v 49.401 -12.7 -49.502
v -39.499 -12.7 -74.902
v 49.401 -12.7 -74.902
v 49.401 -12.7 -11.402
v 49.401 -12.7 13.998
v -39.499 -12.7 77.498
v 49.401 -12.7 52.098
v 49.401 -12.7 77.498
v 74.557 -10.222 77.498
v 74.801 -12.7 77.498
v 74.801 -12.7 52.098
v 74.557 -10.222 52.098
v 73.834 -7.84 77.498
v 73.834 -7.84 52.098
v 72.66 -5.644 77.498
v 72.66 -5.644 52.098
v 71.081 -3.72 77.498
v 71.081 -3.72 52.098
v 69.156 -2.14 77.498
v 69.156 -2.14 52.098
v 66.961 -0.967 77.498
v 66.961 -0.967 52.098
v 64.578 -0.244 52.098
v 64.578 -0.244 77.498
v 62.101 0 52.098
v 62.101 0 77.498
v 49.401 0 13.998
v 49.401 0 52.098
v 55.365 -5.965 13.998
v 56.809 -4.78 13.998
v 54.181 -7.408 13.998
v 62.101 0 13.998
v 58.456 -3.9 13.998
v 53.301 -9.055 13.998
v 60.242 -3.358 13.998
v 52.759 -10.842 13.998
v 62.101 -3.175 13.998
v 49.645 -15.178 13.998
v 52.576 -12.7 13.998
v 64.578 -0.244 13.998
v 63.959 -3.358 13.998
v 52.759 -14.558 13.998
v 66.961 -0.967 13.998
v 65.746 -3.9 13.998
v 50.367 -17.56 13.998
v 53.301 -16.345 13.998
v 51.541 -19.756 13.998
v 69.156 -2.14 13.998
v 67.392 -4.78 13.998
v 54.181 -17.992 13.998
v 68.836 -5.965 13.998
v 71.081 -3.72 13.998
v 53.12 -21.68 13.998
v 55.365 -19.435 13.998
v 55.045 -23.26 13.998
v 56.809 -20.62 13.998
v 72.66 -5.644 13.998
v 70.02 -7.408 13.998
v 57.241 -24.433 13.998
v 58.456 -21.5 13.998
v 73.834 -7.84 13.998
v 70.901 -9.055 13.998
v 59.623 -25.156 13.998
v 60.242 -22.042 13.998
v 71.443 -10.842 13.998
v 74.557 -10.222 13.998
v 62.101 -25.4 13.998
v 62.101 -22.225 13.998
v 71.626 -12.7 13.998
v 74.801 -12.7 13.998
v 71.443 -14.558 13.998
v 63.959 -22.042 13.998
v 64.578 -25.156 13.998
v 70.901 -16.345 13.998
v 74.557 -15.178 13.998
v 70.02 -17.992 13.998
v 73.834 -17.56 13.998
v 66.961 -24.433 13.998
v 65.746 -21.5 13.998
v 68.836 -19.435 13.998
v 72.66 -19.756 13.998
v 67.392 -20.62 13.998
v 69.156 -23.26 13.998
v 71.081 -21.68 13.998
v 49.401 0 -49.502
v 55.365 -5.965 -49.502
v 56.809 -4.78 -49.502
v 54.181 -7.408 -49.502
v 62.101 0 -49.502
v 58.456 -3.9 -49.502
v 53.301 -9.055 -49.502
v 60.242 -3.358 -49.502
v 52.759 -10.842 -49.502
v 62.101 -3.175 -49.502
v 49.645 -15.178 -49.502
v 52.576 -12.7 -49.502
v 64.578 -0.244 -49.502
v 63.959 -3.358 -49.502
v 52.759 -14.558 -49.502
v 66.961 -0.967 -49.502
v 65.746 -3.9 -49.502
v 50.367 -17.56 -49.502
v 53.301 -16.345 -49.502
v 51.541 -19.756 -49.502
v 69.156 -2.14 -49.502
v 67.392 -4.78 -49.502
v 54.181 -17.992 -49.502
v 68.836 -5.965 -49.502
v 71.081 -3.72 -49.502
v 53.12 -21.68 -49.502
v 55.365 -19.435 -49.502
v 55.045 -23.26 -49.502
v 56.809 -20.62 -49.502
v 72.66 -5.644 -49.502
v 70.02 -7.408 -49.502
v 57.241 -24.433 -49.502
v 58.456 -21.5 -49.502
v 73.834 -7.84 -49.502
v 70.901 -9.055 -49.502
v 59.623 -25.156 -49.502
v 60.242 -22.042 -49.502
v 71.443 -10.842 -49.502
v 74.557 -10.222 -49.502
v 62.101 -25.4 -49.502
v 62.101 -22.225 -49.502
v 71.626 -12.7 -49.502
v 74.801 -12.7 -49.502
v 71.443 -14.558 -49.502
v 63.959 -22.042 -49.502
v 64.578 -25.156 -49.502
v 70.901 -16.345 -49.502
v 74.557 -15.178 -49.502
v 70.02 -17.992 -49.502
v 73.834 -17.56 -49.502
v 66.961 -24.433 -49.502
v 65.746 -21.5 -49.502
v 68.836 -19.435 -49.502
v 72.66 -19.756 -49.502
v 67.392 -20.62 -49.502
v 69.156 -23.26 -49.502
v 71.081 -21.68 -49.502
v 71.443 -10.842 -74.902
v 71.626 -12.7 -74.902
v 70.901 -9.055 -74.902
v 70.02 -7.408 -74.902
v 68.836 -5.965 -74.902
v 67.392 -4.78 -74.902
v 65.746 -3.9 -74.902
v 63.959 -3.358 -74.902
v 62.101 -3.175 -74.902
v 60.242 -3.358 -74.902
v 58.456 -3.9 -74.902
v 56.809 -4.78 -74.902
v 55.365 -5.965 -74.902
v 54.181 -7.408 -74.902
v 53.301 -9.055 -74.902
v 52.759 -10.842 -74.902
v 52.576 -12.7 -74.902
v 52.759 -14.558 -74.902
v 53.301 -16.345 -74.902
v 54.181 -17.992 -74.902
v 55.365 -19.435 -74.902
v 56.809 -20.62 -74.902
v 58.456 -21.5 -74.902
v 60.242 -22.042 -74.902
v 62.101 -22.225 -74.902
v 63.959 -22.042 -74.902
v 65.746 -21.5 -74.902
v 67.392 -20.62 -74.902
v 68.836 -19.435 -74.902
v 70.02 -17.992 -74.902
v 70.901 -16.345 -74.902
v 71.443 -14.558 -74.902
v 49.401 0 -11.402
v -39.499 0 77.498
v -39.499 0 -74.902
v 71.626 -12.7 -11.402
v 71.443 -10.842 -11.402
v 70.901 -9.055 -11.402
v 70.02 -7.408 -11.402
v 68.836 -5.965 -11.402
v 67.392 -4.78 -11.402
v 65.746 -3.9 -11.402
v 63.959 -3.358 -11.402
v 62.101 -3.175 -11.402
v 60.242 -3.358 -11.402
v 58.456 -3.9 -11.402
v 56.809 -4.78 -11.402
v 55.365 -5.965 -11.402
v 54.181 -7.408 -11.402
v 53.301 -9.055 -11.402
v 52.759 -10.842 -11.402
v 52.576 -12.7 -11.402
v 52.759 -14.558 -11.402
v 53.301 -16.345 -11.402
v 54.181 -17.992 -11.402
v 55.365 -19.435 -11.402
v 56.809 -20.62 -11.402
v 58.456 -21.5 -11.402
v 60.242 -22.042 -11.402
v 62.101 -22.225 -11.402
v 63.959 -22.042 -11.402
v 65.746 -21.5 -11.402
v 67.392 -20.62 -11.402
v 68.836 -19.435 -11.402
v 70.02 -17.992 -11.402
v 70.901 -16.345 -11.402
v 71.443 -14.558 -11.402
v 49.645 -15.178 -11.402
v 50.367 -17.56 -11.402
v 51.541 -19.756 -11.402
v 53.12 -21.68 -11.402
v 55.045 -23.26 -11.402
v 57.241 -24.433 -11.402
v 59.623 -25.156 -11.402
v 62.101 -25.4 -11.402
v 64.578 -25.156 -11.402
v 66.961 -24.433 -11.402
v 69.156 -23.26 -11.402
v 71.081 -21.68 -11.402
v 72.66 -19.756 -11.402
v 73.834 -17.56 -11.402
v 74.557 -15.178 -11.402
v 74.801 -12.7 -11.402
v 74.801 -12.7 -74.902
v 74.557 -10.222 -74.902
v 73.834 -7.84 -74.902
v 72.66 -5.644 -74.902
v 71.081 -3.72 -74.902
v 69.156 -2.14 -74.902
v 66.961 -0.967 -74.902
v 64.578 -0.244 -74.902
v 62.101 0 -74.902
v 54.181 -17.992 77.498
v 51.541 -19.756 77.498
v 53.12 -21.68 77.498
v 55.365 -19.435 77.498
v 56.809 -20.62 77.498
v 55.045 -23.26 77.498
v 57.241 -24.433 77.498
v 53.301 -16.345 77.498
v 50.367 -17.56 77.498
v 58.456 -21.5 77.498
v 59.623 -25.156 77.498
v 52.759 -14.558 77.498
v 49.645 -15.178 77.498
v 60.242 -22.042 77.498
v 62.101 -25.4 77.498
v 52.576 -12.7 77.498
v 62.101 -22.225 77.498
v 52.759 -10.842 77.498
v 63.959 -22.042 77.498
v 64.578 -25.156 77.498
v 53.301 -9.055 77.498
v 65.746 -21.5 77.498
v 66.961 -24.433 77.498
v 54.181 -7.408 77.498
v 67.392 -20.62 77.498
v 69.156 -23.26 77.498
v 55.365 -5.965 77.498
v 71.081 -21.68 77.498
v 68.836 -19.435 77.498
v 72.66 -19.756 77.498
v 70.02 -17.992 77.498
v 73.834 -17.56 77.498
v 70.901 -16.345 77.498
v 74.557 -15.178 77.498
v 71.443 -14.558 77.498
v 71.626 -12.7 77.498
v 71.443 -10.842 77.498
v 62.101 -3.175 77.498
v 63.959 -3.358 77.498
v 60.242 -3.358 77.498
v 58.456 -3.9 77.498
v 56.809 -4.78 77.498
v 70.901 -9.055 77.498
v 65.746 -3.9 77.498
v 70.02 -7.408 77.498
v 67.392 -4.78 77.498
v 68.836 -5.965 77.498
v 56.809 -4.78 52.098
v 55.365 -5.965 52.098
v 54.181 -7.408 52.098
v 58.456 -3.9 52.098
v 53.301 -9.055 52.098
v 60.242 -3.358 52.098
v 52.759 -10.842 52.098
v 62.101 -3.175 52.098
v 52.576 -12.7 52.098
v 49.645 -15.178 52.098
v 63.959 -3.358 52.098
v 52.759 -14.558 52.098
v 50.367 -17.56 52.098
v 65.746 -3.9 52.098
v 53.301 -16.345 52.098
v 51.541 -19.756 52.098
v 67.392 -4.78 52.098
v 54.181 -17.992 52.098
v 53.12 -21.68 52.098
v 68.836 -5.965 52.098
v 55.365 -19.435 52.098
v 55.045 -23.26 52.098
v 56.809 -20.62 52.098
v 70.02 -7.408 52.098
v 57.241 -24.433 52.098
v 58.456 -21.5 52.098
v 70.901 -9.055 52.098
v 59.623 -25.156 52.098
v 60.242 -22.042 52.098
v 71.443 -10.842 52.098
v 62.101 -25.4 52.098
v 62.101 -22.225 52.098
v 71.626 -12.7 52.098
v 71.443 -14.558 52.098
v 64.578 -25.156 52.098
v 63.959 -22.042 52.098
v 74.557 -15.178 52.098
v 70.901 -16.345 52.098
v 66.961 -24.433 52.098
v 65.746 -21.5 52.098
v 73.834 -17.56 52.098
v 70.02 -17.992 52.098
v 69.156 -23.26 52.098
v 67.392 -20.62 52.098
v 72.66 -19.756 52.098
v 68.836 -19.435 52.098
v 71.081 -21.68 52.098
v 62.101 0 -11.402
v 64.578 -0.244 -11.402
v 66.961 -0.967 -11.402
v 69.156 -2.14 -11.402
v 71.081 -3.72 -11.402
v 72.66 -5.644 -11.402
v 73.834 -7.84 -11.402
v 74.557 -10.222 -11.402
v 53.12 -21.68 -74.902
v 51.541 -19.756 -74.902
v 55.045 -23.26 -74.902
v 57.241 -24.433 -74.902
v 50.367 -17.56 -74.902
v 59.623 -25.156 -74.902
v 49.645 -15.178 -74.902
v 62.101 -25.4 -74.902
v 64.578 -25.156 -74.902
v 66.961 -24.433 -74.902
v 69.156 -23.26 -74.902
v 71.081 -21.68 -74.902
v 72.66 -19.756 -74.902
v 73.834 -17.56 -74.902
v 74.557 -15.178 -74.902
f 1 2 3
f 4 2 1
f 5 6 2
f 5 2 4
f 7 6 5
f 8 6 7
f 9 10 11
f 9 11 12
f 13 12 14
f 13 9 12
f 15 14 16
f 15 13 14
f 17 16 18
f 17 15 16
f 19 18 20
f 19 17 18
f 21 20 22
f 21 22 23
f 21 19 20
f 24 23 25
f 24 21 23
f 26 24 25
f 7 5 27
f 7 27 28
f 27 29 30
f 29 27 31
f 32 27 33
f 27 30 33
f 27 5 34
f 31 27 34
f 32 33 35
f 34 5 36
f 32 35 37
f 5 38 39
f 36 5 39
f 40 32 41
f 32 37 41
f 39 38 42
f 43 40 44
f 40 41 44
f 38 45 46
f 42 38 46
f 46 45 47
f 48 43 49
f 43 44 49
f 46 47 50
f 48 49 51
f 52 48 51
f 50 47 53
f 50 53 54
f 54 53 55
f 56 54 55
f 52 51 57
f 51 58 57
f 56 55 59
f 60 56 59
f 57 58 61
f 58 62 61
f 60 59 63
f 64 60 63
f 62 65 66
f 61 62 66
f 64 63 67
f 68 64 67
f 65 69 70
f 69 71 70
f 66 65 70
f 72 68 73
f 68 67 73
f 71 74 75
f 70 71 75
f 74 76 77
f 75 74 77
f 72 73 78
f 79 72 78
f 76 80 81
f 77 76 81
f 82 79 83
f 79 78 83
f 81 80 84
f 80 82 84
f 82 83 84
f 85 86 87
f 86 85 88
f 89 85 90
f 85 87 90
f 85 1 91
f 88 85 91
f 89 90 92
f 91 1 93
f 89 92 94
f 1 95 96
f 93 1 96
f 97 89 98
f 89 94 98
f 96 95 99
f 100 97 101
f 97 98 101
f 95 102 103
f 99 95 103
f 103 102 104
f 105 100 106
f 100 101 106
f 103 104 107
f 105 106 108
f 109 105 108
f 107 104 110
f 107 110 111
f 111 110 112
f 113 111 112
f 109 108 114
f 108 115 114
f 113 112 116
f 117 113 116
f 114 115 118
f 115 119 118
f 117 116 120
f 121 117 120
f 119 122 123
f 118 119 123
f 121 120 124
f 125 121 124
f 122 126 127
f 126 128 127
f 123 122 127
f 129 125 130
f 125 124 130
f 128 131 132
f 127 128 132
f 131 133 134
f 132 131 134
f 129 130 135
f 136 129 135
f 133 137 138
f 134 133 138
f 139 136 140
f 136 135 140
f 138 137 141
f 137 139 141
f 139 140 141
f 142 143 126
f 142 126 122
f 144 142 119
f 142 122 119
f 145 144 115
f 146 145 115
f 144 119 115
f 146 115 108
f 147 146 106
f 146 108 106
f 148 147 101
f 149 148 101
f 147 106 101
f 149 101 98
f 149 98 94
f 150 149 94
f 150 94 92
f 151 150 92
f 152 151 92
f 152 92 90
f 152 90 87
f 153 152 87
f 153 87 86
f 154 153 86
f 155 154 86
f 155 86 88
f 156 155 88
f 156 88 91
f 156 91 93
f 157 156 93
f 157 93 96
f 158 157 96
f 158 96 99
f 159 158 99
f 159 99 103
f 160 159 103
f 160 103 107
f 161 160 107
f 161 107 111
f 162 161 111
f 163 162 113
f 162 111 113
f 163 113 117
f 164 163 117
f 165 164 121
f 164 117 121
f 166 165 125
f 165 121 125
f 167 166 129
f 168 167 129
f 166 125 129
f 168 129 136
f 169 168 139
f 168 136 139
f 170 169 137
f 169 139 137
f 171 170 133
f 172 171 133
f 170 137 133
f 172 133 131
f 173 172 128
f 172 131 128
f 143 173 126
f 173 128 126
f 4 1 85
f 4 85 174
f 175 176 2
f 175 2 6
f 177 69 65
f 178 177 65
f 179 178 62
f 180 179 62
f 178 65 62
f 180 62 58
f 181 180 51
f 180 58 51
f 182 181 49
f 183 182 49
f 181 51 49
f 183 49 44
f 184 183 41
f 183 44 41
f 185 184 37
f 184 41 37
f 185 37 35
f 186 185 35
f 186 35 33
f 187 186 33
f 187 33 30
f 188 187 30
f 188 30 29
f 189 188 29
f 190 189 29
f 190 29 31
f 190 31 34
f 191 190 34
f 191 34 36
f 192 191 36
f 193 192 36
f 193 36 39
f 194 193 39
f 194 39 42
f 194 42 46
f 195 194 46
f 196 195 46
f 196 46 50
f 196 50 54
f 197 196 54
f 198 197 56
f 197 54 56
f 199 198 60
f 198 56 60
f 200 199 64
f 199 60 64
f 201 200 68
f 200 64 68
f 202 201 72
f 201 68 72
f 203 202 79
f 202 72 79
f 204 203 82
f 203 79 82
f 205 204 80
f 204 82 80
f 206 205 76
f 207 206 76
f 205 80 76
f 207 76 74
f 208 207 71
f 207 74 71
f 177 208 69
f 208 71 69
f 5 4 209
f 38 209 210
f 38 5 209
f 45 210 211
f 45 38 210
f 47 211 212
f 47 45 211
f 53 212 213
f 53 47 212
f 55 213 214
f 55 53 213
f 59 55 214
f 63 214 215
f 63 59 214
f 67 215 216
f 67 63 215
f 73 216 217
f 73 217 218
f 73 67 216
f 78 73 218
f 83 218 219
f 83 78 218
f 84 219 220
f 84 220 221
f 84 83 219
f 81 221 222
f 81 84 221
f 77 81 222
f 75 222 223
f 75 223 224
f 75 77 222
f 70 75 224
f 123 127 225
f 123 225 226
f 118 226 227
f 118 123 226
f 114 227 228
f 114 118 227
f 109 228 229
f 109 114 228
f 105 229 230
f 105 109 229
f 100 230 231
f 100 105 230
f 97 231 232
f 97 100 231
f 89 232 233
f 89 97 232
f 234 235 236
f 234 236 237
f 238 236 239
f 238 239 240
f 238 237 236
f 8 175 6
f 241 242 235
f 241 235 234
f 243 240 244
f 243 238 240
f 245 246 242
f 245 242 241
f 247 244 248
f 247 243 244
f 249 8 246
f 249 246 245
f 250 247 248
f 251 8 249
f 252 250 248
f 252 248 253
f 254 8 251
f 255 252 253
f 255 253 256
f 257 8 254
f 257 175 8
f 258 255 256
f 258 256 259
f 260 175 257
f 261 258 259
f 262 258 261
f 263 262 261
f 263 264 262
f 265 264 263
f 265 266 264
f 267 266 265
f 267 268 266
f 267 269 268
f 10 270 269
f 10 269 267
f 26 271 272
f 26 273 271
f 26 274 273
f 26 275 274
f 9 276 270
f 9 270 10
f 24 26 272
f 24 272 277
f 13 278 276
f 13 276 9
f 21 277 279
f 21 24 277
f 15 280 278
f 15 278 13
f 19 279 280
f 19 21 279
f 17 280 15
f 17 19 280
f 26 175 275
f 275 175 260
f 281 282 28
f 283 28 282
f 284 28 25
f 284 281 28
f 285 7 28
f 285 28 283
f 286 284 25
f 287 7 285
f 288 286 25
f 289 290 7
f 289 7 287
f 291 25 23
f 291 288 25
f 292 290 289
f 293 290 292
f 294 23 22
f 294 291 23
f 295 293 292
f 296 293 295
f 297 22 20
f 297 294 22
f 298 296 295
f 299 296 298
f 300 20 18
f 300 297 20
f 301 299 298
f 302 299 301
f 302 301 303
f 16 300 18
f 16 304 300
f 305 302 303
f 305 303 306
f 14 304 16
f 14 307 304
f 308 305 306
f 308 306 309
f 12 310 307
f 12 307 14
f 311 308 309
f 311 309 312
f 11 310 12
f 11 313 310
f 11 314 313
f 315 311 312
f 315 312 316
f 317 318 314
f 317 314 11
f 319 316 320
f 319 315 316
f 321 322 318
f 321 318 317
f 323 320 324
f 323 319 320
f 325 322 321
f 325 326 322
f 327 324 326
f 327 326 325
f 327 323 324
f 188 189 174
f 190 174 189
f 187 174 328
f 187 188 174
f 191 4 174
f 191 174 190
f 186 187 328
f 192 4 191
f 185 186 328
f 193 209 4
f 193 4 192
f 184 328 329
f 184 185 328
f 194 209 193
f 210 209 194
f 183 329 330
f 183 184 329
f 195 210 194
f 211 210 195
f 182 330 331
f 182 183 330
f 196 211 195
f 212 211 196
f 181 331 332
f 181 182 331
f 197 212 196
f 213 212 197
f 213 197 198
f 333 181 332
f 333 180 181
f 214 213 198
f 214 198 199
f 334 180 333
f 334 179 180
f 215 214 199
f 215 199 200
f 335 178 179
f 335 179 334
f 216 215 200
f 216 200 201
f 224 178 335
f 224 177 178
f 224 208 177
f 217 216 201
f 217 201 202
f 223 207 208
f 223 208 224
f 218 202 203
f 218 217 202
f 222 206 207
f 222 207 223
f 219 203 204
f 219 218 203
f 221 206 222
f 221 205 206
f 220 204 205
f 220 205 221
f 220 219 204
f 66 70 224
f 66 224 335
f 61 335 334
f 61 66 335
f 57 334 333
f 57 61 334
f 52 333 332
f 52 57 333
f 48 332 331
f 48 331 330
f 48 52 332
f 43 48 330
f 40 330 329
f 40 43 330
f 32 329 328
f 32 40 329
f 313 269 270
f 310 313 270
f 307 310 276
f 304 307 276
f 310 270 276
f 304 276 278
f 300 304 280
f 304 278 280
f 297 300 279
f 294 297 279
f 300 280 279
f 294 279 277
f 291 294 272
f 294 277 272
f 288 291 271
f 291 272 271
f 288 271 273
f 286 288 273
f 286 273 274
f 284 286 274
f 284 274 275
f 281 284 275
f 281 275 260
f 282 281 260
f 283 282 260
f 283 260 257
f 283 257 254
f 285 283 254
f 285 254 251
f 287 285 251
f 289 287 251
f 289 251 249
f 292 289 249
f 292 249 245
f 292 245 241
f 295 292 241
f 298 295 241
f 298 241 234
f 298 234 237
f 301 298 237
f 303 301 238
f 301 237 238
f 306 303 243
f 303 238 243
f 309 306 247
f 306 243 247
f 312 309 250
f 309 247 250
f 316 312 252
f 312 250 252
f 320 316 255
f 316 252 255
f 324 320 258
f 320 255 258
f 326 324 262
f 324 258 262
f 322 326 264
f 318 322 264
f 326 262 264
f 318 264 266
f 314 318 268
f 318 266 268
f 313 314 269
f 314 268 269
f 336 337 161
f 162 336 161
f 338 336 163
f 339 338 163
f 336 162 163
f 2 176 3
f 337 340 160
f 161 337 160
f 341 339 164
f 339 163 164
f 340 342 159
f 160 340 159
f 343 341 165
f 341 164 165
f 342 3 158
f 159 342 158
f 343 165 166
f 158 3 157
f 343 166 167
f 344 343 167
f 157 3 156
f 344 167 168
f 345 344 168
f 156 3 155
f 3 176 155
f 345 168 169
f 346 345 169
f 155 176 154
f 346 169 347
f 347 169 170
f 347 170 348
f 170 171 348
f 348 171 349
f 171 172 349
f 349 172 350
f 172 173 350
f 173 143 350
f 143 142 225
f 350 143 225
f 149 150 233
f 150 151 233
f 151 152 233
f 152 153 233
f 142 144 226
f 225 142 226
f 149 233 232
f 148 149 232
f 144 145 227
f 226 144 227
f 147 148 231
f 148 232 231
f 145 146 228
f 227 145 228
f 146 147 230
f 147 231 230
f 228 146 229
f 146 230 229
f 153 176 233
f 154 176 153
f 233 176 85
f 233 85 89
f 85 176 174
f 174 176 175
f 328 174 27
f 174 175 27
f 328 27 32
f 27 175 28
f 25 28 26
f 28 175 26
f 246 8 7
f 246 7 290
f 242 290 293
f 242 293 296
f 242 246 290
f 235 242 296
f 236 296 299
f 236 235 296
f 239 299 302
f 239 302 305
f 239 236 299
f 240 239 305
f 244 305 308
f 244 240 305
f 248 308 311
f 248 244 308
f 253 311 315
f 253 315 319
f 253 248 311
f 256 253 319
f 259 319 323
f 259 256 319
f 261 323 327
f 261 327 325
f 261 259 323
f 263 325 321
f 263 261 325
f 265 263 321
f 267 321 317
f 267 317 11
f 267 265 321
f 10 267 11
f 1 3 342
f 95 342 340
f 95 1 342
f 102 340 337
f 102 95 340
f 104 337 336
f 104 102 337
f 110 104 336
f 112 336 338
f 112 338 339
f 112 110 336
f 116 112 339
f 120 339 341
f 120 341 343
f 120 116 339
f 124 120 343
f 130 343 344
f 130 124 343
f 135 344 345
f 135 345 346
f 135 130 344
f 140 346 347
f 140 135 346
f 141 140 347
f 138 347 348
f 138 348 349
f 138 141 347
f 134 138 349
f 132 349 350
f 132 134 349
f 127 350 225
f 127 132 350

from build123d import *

# Parameters (mm, degrees)
F0_W     = 101.6
F0_H     = 152.4
F1_DEPTH = 12.7
F3_DEPTH = 152.4
F4_R     = 9.525
F5_DEPTH = 152.4
F7_W     = 50.8
F7_H     = 38.1
F8_DEPTH = 50.8


# Not quite as in the source:
# - a feature names something its author has since deleted; it is built from what else it names


with BuildPart() as f1:
    # F0 (on Front) → F1 (new body)
    with BuildSketch(Plane.XZ):
        with Locations((11.3006858155, 1.2977712616)):
            Rectangle(F0_W, F0_H)
    extrude(amount=F1_DEPTH)

    # F2 (on face) → F3 (join)
    with BuildSketch(Plane.XY.offset(77.4977712616)):
        with BuildLine():
            ThreePointArc((49.4006858155, -12.7), (62.1006858155, -25.4), (74.8006858155, -12.7))
            ThreePointArc((74.8006858155, -12.7), (71.0809419366, -3.7197438789), (62.1006858155, 0))
            Line((62.1006858155, 0), (62.1006858155, -12.7))
            Line((62.1006858155, -12.7), (49.4006858155, -12.7))
        make_face()
    extrude(amount=-F3_DEPTH)

    # F4 (on face) → F5 (cut, through all)
    with BuildSketch(Plane.XY.offset(77.4977712616)):
        with Locations((62.1006858155, -12.7)):
            Circle(F4_R)
    extrude(amount=-F5_DEPTH, mode=Mode.SUBTRACT)

    # F7 (on offset) → F8 (cut)
    with BuildSketch(Plane.XZ.offset(25.4)):
        with Locations((74.8006858155, 33.0477712616)):
            Rectangle(F7_W, F7_H)
        with Locations((74.8006858155, -30.4522287384)):
            Rectangle(F7_W, F7_H)
    extrude(amount=-F8_DEPTH, mode=Mode.SUBTRACT)


solid = f1.part
